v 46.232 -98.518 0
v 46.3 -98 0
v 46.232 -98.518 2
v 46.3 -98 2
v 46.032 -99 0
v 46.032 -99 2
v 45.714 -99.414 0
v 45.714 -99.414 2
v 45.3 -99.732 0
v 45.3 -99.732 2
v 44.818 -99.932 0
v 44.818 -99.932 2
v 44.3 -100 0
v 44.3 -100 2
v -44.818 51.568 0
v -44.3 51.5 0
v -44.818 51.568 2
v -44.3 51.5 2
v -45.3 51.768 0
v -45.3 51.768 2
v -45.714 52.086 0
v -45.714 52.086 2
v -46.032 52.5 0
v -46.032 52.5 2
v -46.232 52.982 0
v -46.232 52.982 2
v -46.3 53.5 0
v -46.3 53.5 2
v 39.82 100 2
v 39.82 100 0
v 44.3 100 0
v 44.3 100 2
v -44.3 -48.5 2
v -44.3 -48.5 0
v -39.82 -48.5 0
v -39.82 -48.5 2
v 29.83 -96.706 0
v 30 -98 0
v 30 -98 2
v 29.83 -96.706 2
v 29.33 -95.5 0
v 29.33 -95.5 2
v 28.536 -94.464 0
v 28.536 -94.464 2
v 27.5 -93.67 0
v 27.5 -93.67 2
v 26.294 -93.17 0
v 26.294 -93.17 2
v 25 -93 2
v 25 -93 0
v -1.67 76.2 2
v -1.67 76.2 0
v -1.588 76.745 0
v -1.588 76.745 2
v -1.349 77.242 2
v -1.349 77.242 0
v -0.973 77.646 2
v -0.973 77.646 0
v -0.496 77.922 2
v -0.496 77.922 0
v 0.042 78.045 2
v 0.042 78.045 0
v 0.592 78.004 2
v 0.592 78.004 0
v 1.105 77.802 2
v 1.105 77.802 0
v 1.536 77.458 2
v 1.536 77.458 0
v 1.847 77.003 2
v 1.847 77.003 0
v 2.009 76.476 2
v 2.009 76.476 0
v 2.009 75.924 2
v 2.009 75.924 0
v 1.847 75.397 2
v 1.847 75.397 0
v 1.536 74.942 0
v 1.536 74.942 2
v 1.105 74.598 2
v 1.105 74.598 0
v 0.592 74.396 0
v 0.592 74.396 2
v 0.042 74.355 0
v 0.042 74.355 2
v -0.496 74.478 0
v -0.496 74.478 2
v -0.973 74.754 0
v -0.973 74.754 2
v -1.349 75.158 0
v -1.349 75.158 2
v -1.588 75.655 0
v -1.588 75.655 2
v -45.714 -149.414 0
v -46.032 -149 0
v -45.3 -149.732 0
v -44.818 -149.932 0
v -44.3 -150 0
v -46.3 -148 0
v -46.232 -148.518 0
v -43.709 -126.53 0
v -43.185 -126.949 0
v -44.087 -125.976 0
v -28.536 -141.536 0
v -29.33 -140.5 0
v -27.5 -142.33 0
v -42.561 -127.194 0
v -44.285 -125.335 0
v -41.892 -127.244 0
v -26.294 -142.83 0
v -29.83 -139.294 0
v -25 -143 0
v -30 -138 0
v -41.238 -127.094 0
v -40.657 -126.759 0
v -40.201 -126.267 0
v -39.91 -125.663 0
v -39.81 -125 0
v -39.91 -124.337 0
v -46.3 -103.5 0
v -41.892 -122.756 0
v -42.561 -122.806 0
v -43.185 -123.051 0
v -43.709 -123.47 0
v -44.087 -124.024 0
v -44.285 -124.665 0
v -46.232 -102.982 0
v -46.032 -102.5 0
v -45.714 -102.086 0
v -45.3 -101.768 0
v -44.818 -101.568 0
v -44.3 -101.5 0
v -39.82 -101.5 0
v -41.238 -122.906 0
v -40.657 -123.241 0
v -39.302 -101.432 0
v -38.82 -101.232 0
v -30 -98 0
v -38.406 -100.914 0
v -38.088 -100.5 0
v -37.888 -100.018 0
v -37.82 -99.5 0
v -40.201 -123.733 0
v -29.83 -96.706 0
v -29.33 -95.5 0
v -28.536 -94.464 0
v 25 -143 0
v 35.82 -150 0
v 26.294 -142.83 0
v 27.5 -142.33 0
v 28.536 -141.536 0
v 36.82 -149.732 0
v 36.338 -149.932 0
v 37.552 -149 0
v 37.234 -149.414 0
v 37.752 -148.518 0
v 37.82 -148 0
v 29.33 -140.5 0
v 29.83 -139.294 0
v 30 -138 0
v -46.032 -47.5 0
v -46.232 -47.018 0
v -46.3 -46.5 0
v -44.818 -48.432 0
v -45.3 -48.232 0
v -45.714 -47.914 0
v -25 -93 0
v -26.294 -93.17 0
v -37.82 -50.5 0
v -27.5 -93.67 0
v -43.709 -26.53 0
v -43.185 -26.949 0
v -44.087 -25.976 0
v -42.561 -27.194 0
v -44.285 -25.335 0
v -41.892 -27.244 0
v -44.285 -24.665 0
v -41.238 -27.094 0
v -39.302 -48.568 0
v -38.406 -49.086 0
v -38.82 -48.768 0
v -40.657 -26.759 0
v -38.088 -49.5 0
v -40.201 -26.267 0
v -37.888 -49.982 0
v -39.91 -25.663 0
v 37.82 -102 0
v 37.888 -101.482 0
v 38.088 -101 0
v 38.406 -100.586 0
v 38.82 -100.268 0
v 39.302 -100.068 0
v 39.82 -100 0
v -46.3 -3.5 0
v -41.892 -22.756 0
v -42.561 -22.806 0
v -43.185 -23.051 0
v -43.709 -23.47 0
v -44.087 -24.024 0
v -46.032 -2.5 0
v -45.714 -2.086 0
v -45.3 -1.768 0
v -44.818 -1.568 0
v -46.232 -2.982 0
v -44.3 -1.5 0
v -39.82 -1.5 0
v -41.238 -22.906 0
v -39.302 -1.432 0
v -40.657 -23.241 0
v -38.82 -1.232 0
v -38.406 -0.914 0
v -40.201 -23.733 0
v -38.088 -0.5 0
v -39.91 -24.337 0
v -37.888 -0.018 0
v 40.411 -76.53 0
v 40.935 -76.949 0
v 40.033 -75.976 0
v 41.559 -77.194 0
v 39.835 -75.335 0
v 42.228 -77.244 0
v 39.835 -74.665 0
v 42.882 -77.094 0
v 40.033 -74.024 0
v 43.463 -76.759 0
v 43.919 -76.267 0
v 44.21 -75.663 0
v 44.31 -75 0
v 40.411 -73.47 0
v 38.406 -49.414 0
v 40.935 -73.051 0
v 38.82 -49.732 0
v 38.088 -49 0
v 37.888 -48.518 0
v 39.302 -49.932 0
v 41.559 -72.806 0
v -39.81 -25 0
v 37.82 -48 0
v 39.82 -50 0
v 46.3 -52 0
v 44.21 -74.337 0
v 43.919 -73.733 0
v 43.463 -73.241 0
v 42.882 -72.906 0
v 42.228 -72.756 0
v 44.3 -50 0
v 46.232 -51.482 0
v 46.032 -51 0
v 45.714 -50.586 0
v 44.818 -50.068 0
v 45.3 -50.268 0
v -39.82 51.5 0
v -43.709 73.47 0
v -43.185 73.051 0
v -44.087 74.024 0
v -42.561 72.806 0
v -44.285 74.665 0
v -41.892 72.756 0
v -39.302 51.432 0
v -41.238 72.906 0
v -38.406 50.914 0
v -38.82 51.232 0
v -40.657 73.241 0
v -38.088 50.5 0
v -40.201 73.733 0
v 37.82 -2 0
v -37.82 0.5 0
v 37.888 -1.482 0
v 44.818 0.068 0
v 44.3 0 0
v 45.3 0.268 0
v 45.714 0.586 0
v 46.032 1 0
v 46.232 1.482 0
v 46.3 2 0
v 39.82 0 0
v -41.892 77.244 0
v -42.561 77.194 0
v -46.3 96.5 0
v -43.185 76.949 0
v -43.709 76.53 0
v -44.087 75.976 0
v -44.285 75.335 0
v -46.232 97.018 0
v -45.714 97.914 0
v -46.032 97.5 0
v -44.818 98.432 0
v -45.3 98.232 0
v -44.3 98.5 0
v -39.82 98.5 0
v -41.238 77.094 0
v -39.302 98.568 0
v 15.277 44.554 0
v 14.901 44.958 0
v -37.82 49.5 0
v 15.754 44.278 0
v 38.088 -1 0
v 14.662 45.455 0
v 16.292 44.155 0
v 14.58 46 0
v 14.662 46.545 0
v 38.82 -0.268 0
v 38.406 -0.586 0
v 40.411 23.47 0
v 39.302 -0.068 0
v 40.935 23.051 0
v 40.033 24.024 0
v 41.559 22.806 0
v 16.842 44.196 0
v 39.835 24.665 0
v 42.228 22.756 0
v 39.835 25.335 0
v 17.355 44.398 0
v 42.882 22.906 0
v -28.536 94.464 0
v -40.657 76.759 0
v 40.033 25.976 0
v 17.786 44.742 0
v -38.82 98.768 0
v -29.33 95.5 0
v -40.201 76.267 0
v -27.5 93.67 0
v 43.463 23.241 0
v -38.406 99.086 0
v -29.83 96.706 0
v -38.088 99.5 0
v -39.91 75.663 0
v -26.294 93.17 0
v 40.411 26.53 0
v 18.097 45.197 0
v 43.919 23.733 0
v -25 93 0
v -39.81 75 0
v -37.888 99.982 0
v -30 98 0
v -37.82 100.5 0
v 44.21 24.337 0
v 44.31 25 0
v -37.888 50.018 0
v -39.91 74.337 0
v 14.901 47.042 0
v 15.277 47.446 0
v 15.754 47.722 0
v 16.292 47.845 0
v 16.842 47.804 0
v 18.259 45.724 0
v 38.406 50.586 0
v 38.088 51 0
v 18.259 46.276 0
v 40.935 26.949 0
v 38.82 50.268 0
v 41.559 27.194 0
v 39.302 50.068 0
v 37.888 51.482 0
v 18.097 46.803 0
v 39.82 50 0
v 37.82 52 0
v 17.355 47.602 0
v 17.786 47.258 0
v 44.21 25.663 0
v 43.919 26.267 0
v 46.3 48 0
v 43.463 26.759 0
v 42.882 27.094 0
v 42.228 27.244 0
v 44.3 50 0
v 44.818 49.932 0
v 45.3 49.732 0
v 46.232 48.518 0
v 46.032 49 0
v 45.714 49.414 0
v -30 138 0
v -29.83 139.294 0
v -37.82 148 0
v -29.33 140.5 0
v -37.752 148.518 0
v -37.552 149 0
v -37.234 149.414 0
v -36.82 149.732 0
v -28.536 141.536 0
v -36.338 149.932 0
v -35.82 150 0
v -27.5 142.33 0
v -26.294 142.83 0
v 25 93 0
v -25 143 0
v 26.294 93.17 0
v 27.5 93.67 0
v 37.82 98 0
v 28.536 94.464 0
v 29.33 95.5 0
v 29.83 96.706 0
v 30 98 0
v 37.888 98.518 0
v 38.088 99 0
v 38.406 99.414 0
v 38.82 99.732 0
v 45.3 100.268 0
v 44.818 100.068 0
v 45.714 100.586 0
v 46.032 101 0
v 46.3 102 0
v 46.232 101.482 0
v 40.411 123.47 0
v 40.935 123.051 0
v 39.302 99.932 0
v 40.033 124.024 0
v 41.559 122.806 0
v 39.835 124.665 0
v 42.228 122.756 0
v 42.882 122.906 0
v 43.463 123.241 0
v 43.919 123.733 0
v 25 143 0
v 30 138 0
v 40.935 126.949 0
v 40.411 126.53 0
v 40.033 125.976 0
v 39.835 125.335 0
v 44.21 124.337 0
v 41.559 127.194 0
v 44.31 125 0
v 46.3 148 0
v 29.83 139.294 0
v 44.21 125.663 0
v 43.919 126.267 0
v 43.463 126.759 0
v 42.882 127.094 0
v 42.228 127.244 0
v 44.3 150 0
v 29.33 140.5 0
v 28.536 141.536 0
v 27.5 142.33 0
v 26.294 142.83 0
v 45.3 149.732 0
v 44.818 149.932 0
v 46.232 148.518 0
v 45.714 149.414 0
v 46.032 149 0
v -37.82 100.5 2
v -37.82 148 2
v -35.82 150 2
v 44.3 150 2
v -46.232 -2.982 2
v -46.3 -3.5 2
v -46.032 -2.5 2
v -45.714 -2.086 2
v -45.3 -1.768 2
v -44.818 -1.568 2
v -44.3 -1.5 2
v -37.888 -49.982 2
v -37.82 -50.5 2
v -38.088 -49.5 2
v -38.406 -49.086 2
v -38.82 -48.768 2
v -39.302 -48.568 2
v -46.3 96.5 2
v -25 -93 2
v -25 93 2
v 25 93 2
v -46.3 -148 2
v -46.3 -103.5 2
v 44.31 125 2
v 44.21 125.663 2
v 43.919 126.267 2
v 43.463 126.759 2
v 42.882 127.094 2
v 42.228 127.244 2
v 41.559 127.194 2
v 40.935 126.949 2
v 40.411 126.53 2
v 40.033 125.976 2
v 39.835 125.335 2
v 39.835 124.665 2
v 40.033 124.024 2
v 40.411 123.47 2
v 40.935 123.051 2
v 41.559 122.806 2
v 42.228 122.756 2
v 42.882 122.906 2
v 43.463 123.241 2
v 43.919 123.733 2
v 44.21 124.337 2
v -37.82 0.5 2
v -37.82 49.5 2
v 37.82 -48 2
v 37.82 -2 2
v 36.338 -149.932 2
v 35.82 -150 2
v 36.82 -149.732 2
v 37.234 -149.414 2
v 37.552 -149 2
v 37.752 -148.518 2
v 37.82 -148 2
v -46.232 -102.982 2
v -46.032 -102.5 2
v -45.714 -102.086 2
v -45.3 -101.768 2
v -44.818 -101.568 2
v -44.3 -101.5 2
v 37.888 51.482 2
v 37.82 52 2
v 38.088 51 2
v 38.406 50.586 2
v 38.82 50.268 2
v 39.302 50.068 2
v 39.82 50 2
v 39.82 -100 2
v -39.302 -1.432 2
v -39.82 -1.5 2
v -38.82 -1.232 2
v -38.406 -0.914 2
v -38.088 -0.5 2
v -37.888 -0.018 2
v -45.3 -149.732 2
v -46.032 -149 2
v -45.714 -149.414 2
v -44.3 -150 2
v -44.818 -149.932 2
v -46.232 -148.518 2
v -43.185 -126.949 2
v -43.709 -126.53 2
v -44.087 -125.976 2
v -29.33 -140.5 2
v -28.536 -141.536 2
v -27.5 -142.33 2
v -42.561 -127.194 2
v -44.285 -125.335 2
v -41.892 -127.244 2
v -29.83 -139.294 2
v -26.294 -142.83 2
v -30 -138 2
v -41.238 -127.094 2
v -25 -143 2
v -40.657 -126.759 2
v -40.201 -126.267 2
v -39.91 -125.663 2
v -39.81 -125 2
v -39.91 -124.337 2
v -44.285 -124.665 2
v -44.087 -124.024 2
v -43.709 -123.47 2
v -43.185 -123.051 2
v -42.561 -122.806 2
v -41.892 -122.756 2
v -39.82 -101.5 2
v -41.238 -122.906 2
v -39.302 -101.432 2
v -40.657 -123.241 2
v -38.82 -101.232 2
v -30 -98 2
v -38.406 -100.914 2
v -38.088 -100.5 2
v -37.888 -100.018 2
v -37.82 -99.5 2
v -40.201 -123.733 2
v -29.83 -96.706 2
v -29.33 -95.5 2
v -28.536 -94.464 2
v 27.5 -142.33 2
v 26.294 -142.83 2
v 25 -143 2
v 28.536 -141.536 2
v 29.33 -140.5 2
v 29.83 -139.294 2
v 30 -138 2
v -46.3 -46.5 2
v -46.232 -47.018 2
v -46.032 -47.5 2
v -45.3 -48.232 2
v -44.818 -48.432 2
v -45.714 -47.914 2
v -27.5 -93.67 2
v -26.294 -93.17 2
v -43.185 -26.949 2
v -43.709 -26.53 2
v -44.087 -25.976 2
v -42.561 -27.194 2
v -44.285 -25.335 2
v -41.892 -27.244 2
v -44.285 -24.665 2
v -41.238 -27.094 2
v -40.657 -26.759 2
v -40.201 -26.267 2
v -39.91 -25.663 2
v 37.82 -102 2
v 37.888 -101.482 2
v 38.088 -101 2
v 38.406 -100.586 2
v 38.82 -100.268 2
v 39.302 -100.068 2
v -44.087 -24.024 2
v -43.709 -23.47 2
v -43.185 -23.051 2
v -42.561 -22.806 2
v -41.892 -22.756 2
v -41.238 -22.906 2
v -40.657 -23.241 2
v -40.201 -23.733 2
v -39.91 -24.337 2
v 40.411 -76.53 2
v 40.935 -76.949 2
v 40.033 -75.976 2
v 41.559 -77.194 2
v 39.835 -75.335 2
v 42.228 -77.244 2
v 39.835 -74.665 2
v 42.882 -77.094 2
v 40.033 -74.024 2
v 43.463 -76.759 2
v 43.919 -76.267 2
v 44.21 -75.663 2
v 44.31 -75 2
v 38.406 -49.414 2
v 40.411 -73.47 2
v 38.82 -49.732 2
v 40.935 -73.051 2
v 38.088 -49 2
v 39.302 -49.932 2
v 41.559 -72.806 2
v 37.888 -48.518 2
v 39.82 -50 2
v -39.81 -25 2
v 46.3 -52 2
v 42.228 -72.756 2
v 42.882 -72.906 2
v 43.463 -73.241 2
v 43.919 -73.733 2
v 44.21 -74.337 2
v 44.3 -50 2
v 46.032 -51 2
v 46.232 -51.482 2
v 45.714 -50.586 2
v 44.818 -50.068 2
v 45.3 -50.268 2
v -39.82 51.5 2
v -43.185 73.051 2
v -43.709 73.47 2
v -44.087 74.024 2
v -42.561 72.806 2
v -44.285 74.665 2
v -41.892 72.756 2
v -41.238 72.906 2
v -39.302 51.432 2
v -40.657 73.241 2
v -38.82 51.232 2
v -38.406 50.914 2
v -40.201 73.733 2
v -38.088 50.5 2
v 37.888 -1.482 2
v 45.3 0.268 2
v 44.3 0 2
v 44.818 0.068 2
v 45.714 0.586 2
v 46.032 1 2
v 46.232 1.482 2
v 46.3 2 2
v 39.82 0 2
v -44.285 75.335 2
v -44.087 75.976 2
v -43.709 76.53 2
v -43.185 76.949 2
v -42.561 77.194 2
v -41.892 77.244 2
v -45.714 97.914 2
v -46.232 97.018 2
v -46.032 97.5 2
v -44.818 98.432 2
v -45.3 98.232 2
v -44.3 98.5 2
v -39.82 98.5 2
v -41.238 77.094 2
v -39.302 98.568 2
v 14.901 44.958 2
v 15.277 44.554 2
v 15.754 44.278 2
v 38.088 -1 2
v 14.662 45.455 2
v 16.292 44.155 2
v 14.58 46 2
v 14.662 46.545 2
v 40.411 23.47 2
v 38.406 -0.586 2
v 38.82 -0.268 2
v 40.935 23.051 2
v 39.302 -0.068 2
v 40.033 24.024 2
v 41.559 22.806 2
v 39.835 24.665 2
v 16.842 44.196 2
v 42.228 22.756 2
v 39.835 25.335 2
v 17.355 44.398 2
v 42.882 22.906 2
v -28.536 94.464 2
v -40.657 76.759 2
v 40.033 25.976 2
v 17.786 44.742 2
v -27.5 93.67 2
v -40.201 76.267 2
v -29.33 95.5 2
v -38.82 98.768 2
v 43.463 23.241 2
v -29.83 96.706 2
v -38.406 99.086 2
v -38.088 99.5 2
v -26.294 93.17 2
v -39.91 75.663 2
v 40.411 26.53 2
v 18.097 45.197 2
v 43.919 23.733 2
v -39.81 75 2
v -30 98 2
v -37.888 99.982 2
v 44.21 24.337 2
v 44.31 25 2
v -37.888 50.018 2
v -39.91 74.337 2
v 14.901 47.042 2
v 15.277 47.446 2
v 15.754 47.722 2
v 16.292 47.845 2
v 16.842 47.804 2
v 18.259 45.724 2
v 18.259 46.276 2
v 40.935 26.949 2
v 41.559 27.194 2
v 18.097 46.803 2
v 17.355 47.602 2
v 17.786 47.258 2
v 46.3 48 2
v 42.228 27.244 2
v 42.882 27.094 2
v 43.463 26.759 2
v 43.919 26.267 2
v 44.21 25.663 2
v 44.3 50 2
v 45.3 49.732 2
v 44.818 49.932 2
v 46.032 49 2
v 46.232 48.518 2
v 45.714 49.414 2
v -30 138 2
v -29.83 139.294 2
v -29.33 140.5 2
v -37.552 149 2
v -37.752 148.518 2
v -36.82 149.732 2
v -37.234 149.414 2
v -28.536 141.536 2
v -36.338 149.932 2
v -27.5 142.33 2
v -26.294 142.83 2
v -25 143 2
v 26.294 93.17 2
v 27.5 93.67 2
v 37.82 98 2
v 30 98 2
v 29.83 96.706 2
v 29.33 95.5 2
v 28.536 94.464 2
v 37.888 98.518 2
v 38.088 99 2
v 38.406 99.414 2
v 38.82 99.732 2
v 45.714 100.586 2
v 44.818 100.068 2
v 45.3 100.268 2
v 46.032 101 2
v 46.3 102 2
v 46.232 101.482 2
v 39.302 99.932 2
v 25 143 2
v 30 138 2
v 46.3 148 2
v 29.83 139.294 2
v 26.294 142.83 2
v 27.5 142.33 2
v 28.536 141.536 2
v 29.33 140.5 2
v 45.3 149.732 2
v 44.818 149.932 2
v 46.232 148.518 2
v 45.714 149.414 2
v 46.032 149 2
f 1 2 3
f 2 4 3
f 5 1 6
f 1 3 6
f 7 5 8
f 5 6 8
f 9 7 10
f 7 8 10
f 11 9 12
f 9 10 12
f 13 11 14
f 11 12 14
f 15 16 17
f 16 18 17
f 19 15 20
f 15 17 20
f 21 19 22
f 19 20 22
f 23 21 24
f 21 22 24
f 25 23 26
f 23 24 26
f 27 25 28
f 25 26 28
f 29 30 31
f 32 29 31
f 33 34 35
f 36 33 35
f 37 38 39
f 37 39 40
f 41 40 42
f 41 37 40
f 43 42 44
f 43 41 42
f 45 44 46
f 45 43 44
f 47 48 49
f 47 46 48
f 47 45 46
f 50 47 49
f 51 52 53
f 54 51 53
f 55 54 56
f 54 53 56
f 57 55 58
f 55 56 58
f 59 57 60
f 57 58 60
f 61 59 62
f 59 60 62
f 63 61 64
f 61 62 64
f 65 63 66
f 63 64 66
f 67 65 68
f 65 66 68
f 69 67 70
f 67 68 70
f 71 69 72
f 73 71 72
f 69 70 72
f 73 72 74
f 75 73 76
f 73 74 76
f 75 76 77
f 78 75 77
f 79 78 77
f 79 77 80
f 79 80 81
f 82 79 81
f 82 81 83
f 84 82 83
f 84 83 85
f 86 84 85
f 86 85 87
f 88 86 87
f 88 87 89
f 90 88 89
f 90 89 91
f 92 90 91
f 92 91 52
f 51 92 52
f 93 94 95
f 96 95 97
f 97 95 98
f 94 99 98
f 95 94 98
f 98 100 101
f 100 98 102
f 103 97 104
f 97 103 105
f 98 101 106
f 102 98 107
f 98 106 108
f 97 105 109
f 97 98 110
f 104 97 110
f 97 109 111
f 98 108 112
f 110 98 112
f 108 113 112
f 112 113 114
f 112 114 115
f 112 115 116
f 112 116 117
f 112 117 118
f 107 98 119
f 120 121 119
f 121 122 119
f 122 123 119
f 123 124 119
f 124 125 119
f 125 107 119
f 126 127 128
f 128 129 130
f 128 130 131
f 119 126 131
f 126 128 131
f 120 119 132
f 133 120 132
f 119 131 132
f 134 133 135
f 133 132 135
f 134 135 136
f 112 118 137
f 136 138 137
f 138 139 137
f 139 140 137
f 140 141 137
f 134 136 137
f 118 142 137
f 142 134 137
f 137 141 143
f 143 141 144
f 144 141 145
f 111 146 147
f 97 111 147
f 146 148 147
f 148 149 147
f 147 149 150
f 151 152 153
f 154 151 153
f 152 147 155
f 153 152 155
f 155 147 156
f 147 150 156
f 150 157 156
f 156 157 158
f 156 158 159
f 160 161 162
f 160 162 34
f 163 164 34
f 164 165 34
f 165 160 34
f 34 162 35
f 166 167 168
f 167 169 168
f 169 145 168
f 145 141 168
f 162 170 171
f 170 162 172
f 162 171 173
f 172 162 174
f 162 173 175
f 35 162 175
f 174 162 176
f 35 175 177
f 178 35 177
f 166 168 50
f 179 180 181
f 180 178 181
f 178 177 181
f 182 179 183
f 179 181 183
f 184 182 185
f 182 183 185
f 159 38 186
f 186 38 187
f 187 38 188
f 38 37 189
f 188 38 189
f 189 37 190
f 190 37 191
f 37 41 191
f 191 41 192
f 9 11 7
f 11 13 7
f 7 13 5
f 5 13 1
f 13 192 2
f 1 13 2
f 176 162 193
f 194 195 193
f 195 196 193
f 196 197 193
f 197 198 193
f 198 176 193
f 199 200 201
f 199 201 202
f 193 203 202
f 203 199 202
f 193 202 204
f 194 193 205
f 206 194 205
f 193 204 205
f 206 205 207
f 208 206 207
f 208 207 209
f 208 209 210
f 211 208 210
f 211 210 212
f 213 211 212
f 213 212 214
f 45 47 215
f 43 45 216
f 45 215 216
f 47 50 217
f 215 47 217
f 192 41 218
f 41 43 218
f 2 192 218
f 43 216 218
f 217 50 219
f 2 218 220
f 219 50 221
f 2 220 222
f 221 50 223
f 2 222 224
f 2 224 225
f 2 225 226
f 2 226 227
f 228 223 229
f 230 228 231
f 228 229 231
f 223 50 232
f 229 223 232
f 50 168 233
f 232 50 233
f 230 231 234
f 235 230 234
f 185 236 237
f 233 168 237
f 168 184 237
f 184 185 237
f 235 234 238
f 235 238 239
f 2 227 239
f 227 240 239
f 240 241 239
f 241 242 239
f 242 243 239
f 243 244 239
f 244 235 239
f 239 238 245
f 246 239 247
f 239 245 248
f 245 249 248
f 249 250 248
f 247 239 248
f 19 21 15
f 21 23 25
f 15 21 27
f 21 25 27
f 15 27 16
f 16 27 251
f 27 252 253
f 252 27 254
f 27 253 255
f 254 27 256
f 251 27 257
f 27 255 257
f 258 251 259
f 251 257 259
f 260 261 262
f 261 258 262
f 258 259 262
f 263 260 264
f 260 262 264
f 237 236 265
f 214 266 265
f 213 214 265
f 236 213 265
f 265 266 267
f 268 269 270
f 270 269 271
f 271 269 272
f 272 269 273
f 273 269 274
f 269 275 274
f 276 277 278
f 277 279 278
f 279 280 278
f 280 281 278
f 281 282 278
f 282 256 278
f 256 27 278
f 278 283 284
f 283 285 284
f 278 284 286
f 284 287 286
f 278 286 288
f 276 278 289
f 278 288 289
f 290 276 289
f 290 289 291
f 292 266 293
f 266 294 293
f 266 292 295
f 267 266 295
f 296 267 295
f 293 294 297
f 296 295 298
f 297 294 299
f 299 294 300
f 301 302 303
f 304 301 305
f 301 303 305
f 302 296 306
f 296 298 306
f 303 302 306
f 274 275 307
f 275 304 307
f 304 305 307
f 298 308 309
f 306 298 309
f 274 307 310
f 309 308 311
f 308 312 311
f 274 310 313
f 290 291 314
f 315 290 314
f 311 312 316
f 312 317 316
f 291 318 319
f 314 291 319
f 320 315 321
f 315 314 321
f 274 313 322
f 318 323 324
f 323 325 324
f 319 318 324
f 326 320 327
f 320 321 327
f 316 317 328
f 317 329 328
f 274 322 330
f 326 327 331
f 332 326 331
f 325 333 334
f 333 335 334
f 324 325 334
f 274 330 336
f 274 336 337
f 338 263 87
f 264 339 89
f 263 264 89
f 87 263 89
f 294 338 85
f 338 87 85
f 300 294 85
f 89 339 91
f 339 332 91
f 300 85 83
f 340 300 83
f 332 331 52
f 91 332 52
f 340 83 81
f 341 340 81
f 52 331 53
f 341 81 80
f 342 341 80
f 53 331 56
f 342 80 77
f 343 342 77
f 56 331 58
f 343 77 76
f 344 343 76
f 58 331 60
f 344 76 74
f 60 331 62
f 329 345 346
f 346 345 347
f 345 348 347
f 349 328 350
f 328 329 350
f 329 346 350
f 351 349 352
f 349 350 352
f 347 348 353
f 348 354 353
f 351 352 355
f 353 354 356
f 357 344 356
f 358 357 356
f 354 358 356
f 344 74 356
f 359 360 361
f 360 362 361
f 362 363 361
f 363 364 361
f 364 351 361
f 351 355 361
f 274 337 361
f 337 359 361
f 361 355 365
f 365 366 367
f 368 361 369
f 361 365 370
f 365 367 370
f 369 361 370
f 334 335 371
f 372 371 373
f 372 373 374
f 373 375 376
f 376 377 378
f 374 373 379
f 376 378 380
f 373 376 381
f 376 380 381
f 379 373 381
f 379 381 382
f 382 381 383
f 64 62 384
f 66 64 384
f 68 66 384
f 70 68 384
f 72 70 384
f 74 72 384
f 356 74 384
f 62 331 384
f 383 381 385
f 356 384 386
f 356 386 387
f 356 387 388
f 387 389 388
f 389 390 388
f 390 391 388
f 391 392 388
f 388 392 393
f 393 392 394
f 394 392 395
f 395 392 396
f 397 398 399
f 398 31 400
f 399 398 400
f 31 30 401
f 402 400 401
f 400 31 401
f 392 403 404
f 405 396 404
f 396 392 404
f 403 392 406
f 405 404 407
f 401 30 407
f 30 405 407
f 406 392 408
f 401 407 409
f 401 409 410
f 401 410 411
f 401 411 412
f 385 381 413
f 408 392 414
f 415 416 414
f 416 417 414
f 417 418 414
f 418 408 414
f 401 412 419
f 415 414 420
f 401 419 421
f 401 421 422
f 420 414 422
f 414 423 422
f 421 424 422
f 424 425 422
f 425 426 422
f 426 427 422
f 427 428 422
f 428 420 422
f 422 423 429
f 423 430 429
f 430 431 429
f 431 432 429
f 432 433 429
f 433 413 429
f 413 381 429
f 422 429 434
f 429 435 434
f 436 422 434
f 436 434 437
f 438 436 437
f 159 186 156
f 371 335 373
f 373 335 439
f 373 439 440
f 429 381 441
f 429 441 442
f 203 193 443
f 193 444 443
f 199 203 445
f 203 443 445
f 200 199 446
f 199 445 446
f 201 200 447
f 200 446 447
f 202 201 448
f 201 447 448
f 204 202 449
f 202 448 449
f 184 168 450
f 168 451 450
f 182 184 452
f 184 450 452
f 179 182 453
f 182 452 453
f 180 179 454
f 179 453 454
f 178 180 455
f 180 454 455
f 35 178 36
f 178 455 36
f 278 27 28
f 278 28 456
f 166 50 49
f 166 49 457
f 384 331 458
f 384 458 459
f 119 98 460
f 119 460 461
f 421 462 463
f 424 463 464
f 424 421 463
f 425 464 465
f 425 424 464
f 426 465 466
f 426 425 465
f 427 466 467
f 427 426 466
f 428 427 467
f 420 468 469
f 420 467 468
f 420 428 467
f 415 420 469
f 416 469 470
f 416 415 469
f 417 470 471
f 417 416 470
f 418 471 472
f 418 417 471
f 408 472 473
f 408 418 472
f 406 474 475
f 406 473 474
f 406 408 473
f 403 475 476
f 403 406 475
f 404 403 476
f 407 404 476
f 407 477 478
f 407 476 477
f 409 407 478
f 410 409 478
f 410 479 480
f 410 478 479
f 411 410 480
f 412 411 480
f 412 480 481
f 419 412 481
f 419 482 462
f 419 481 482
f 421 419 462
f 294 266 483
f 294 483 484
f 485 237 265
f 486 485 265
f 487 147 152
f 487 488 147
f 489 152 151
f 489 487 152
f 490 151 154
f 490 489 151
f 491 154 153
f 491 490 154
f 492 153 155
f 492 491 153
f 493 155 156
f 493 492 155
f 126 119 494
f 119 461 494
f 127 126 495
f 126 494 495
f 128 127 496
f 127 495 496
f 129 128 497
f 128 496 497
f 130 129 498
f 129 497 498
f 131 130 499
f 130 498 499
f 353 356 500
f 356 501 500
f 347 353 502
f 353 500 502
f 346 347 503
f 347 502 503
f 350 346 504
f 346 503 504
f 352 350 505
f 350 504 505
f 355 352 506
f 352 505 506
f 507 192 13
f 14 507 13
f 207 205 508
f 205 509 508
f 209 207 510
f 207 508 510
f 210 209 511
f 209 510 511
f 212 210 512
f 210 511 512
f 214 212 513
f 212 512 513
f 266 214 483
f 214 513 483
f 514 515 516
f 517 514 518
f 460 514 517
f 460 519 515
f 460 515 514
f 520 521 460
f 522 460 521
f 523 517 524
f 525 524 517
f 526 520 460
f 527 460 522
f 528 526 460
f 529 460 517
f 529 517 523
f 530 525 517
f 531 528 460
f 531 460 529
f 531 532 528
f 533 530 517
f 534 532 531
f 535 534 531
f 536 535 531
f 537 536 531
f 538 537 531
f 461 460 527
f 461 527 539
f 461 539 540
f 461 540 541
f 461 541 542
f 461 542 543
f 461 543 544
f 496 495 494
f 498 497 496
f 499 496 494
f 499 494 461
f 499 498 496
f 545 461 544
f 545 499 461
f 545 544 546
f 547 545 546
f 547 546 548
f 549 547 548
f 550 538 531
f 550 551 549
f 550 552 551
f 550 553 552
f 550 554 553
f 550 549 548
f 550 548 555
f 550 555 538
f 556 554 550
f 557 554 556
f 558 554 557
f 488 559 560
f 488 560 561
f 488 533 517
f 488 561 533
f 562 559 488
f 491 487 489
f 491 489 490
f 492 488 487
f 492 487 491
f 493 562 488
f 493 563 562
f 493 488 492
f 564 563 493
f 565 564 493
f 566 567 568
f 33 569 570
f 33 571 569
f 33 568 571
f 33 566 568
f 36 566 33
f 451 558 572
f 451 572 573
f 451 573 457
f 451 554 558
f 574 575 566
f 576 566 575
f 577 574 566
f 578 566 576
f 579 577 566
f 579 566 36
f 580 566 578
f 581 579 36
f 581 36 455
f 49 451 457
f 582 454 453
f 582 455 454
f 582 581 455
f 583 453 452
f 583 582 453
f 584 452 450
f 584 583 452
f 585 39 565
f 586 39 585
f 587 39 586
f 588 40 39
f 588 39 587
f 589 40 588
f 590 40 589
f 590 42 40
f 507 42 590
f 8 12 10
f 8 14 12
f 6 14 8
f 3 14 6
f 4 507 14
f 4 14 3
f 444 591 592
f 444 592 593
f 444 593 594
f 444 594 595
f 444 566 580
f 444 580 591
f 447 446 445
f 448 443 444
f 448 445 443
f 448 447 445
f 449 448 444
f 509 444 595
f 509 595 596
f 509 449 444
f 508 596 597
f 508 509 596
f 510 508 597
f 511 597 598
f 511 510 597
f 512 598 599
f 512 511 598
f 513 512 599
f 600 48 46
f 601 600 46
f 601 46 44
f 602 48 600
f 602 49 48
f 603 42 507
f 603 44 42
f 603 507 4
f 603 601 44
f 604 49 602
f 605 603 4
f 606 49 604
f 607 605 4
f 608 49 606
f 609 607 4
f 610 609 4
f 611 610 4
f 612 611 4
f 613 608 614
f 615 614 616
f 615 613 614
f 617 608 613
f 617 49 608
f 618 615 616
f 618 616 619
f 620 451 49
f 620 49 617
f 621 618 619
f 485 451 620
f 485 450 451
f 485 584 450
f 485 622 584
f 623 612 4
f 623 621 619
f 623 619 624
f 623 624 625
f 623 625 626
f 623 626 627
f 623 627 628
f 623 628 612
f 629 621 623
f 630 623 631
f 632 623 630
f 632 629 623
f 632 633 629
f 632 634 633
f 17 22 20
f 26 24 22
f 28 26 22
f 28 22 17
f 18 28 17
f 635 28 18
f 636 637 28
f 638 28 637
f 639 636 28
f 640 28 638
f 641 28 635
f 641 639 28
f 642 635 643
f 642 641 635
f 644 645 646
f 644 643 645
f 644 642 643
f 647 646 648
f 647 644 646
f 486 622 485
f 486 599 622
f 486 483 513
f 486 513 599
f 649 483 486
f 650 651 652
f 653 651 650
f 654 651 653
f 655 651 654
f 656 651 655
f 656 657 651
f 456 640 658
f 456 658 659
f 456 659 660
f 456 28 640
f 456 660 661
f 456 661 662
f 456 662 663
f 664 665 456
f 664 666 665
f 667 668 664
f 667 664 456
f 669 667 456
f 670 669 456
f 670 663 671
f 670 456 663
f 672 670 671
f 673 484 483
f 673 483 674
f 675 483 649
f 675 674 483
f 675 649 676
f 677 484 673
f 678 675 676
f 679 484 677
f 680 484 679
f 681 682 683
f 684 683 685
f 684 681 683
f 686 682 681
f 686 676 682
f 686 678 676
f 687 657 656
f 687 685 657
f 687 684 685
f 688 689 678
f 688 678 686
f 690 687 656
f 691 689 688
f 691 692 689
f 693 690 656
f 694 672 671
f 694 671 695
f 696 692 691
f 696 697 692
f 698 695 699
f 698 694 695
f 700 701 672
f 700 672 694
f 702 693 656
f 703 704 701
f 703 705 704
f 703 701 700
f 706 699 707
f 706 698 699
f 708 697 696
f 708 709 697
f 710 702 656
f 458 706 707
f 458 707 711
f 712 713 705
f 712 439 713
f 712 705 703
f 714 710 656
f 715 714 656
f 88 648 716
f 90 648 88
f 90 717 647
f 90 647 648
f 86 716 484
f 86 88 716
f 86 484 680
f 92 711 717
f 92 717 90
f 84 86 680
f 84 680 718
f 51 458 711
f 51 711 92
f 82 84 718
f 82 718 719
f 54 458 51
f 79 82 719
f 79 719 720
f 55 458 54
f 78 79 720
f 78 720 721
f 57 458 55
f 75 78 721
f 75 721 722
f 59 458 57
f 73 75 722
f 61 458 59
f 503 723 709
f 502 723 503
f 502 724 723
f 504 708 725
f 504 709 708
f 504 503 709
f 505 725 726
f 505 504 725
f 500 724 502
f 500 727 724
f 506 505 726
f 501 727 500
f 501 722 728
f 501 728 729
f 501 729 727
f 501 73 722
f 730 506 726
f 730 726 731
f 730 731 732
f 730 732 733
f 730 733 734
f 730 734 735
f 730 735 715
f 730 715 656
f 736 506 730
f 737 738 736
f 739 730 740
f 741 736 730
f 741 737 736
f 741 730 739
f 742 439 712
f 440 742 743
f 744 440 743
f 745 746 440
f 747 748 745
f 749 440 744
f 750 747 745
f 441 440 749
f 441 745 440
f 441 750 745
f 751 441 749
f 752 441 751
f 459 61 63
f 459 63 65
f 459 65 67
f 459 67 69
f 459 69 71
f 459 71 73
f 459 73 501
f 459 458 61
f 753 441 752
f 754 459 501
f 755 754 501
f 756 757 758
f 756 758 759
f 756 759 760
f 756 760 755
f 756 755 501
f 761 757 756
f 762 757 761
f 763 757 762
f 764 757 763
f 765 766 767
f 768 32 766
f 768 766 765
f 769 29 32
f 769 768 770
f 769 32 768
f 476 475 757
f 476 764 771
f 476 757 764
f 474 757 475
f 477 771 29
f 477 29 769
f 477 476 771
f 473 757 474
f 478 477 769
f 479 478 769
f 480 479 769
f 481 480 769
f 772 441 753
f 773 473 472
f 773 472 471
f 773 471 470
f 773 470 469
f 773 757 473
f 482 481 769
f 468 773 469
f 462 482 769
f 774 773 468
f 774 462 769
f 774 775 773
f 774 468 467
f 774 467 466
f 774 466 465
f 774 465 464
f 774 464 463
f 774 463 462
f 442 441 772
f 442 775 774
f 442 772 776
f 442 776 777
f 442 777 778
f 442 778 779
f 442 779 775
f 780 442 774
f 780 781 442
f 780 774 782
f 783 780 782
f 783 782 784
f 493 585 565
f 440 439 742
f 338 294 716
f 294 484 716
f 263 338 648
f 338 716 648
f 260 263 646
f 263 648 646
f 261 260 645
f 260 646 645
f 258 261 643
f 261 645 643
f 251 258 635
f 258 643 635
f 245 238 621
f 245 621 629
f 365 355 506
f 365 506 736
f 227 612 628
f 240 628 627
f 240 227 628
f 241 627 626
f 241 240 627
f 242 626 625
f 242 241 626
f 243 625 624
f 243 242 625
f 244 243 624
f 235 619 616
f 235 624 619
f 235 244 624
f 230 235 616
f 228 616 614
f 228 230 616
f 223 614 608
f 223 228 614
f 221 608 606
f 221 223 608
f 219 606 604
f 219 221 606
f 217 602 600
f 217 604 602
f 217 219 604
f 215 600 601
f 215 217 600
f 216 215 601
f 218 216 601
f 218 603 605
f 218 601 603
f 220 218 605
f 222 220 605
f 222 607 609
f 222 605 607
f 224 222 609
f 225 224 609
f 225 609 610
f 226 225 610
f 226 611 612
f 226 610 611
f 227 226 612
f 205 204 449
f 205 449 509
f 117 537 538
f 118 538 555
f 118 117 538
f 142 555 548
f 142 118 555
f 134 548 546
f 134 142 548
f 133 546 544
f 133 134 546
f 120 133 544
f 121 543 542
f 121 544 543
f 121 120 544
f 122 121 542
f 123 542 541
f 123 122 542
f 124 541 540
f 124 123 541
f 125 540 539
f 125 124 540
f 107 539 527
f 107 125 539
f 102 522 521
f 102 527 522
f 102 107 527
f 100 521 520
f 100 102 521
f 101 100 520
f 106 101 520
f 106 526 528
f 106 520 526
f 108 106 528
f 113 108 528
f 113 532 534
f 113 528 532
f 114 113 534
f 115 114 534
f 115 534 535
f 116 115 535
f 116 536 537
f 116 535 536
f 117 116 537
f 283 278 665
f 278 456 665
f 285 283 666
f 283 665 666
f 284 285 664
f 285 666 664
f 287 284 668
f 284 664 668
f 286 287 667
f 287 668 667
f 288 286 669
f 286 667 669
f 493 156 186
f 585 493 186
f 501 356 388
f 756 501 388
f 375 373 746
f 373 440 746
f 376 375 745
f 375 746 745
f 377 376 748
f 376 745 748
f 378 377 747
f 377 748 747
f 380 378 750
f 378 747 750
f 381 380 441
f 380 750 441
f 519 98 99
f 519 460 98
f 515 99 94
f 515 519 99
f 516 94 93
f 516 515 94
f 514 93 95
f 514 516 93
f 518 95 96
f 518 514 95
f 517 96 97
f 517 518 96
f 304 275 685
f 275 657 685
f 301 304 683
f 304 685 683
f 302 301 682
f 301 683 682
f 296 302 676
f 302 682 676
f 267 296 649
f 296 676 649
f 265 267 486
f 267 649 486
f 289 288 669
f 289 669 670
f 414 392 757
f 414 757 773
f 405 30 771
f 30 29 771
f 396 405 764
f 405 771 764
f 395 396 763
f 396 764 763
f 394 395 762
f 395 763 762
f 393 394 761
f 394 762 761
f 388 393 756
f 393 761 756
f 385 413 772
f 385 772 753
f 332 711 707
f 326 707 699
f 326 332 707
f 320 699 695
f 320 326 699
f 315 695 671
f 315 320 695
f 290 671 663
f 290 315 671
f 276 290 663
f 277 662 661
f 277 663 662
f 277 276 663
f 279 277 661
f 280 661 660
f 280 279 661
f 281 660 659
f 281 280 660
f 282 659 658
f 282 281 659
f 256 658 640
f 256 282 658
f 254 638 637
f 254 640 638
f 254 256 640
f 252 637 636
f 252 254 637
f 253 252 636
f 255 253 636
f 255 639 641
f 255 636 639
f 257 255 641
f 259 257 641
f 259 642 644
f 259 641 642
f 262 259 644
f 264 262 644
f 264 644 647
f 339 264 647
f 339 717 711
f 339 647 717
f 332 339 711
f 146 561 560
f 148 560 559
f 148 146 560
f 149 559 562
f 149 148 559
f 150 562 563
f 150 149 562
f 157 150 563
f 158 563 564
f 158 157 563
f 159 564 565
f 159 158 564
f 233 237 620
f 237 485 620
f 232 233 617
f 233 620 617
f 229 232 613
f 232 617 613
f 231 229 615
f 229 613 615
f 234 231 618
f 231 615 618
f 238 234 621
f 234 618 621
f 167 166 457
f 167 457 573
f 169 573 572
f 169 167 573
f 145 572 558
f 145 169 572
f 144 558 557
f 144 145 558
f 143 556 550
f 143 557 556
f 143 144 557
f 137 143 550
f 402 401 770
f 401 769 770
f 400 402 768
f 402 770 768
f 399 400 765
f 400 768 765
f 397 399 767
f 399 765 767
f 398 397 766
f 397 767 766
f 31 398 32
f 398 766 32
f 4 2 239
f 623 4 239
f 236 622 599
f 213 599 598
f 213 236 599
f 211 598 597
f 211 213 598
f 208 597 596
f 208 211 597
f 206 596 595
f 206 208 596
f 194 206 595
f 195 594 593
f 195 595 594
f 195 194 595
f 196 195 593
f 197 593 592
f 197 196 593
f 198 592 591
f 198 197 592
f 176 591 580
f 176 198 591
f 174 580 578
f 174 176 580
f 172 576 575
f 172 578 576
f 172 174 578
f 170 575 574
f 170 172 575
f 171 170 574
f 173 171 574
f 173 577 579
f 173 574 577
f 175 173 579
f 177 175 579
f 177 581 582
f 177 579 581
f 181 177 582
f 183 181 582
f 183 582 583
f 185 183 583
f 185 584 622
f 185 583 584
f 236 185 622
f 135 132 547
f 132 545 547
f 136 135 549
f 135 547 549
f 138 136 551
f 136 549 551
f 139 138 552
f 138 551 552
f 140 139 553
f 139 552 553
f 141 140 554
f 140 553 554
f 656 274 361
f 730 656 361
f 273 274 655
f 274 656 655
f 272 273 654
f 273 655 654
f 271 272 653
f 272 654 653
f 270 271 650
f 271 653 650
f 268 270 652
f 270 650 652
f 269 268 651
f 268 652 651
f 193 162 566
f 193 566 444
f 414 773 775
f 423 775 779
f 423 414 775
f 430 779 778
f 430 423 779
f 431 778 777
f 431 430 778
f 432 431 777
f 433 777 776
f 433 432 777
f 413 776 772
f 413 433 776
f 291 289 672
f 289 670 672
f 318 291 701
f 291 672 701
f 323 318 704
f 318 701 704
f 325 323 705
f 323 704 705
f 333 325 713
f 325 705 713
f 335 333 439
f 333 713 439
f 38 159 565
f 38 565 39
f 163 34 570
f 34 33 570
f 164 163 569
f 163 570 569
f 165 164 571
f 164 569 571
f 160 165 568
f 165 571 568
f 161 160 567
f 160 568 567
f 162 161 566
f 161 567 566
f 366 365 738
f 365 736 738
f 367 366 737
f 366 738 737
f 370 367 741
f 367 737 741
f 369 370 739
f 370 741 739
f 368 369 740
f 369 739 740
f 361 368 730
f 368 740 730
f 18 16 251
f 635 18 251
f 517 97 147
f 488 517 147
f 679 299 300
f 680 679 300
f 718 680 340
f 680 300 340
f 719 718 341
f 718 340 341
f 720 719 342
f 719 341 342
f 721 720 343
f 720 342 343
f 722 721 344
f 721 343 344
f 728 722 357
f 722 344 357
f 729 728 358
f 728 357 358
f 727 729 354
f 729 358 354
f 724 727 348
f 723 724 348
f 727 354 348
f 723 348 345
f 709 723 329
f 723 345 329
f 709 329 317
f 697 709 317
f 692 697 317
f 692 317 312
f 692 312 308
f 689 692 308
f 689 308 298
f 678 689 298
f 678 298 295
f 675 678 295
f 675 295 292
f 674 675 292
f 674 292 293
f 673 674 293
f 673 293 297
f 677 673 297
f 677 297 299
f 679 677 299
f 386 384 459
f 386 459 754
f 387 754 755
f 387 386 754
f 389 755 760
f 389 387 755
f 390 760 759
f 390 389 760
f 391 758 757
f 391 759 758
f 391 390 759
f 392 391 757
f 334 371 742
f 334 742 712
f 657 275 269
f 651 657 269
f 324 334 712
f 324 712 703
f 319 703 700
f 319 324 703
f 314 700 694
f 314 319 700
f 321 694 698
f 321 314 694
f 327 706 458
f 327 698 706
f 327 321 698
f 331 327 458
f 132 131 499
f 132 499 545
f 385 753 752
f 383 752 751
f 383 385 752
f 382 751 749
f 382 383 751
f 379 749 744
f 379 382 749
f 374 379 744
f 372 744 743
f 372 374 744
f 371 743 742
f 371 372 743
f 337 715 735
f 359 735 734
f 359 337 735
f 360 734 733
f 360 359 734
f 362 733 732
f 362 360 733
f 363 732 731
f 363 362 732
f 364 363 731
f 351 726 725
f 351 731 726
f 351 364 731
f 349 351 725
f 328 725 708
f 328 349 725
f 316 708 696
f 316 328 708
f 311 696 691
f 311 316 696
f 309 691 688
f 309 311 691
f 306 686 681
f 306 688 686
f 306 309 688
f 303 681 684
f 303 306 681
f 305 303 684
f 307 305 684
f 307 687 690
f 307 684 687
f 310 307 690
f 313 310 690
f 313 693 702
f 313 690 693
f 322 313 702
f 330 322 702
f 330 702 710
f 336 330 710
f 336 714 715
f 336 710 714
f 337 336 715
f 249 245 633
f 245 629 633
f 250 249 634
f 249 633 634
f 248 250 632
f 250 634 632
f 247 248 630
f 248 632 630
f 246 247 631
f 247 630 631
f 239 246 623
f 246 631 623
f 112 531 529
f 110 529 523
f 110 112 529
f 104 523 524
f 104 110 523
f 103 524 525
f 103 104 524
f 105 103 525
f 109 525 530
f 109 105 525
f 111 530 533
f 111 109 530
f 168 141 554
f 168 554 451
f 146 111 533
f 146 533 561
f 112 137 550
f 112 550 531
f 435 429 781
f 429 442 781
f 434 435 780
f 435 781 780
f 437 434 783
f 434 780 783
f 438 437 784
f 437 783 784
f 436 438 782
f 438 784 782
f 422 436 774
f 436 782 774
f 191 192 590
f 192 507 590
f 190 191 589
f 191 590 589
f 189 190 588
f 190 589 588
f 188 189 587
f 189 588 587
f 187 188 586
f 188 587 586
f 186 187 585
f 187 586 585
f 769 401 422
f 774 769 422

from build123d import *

# Parameters (mm, degrees)
SKETCH1_W           = 92.6
SKETCH1_H           = 300
BOSS_EXTRUDE1_DEPTH = 2
SKETCH2_R           = 2.25
SKETCH2_W           = 8.48
SKETCH2_H           = 51.5
SKETCH2_H_2         = 50
SKETCH2_H_3         = 53
CUT_EXTRUDE1_DEPTH  = 10
FILLET1_R           = 2
CUT_EXTRUDE3_DEPTH  = 8.5
SKETCH5_R           = 1.85
CUT_EXTRUDE4_DEPTH  = 10


with BuildPart() as part:
    # Sketch1 → Boss-Extrude1 (new body)
    with BuildSketch(Plane.XY):
        Rectangle(SKETCH1_W, SKETCH1_H)
    extrude(amount=BOSS_EXTRUDE1_DEPTH)

    # Sketch2 → Cut-Extrude1 (cut)
    with BuildSketch(Plane.XY):
        with Locations((-42.06, 75)):
            Circle(SKETCH2_R)
        with Locations((42.06, 125)):
            Circle(SKETCH2_R)
        with Locations((42.06, 25)):
            Circle(SKETCH2_R)
        with Locations((42.06, -75)):
            Circle(SKETCH2_R)
        with Locations((-42.06, -25)):
            Circle(SKETCH2_R)
        with Locations((-42.06, -125)):
            Circle(SKETCH2_R)
        with Locations((-42.06, 124.25)):
            Rectangle(SKETCH2_W, SKETCH2_H)
        with Locations((42.06, 75)):
            Rectangle(SKETCH2_W, SKETCH2_H_2)
        with Locations((42.06, -25)):
            Rectangle(SKETCH2_W, SKETCH2_H_2)
        with Locations((-42.06, 25)):
            Rectangle(SKETCH2_W, SKETCH2_H_3)
        with Locations((-42.06, -75)):
            Rectangle(SKETCH2_W, SKETCH2_H_3)
        with Locations((42.06, -125)):
            Rectangle(SKETCH2_W, SKETCH2_H_2)
    extrude(amount=CUT_EXTRUDE1_DEPTH, mode=Mode.SUBTRACT)

    # Fillet1
    fillet1_edges = [part.edges().sort_by_distance(p)[0] for p in [
        (46.3, -100, 1),
        (37.82, -100, 1),
        (37.82, -150, 1),
        (46.3, 50, 1),
        (46.3, 100, 1),
        (37.82, 100, 1),
        (37.82, 50, 1),
        (-46.3, -48.5, 1),
        (-46.3, -101.5, 1),
        (-37.82, -101.5, 1),
        (-37.82, -48.5, 1),
        (37.82, 0, 1),
        (37.82, -50, 1),
        (46.3, -50, 1),
        (46.3, 0, 1),
        (46.3, 150, 1),
        (-46.3, -150, 1),
        (-46.3, 51.5, 1),
        (-46.3, -1.5, 1),
        (-37.82, -1.5, 1),
        (-37.82, 51.5, 1),
        (-46.3, 98.5, 1),
        (-37.82, 98.5, 1),
        (-37.82, 150, 1),
    ]]
    fillet(fillet1_edges, radius=FILLET1_R)

    # Sketch4 → Cut-Extrude3 (cut)
    with BuildSketch(Plane(origin=(0, 0, 0), x_dir=(-1, 0, 0), z_dir=(0, 0, -1))):
        with BuildLine():
            Line((25, 93), (-25, 93))
            ThreePointArc((-25, 93), (-28.535533906, 94.464466094), (-30, 98))
            Line((-30, 98), (-30, 138))
            ThreePointArc((-30, 138), (-28.535533906, 141.535533906), (-25, 143))
            Line((-25, 143), (25, 143))
            ThreePointArc((25, 143), (28.535533906, 141.535533906), (30, 138))
            Line((30, 138), (30, 98))
            ThreePointArc((30, 98), (28.535533906, 94.464466094), (25, 93))
        make_face()
        with BuildLine():
            Line((25, -143), (-25, -143))
            ThreePointArc((-25, -143), (-28.535533906, -141.535533906), (-30, -138))
            Line((-30, -138), (-30, -98))
            ThreePointArc((-30, -98), (-28.535533906, -94.464466094), (-25, -93))
            Line((-25, -93), (25, -93))
            ThreePointArc((25, -93), (28.535533906, -94.464466094), (30, -98))
            Line((30, -98), (30, -138))
            ThreePointArc((30, -138), (28.535533906, -141.535533906), (25, -143))
        make_face()
    extrude(amount=-CUT_EXTRUDE3_DEPTH, mode=Mode.SUBTRACT)

    # Sketch5 → Cut-Extrude4 (cut)
    with BuildSketch(Plane(origin=(0, 0, 0), x_dir=(-1, 0, 0), z_dir=(0, 0, -1))):
        with Locations((-16.43, 46)):
            Circle(SKETCH5_R)
        with Locations((-0.18, 76.2)):
            Circle(SKETCH5_R)
    extrude(amount=-CUT_EXTRUDE4_DEPTH, mode=Mode.SUBTRACT)


solid = part.part
